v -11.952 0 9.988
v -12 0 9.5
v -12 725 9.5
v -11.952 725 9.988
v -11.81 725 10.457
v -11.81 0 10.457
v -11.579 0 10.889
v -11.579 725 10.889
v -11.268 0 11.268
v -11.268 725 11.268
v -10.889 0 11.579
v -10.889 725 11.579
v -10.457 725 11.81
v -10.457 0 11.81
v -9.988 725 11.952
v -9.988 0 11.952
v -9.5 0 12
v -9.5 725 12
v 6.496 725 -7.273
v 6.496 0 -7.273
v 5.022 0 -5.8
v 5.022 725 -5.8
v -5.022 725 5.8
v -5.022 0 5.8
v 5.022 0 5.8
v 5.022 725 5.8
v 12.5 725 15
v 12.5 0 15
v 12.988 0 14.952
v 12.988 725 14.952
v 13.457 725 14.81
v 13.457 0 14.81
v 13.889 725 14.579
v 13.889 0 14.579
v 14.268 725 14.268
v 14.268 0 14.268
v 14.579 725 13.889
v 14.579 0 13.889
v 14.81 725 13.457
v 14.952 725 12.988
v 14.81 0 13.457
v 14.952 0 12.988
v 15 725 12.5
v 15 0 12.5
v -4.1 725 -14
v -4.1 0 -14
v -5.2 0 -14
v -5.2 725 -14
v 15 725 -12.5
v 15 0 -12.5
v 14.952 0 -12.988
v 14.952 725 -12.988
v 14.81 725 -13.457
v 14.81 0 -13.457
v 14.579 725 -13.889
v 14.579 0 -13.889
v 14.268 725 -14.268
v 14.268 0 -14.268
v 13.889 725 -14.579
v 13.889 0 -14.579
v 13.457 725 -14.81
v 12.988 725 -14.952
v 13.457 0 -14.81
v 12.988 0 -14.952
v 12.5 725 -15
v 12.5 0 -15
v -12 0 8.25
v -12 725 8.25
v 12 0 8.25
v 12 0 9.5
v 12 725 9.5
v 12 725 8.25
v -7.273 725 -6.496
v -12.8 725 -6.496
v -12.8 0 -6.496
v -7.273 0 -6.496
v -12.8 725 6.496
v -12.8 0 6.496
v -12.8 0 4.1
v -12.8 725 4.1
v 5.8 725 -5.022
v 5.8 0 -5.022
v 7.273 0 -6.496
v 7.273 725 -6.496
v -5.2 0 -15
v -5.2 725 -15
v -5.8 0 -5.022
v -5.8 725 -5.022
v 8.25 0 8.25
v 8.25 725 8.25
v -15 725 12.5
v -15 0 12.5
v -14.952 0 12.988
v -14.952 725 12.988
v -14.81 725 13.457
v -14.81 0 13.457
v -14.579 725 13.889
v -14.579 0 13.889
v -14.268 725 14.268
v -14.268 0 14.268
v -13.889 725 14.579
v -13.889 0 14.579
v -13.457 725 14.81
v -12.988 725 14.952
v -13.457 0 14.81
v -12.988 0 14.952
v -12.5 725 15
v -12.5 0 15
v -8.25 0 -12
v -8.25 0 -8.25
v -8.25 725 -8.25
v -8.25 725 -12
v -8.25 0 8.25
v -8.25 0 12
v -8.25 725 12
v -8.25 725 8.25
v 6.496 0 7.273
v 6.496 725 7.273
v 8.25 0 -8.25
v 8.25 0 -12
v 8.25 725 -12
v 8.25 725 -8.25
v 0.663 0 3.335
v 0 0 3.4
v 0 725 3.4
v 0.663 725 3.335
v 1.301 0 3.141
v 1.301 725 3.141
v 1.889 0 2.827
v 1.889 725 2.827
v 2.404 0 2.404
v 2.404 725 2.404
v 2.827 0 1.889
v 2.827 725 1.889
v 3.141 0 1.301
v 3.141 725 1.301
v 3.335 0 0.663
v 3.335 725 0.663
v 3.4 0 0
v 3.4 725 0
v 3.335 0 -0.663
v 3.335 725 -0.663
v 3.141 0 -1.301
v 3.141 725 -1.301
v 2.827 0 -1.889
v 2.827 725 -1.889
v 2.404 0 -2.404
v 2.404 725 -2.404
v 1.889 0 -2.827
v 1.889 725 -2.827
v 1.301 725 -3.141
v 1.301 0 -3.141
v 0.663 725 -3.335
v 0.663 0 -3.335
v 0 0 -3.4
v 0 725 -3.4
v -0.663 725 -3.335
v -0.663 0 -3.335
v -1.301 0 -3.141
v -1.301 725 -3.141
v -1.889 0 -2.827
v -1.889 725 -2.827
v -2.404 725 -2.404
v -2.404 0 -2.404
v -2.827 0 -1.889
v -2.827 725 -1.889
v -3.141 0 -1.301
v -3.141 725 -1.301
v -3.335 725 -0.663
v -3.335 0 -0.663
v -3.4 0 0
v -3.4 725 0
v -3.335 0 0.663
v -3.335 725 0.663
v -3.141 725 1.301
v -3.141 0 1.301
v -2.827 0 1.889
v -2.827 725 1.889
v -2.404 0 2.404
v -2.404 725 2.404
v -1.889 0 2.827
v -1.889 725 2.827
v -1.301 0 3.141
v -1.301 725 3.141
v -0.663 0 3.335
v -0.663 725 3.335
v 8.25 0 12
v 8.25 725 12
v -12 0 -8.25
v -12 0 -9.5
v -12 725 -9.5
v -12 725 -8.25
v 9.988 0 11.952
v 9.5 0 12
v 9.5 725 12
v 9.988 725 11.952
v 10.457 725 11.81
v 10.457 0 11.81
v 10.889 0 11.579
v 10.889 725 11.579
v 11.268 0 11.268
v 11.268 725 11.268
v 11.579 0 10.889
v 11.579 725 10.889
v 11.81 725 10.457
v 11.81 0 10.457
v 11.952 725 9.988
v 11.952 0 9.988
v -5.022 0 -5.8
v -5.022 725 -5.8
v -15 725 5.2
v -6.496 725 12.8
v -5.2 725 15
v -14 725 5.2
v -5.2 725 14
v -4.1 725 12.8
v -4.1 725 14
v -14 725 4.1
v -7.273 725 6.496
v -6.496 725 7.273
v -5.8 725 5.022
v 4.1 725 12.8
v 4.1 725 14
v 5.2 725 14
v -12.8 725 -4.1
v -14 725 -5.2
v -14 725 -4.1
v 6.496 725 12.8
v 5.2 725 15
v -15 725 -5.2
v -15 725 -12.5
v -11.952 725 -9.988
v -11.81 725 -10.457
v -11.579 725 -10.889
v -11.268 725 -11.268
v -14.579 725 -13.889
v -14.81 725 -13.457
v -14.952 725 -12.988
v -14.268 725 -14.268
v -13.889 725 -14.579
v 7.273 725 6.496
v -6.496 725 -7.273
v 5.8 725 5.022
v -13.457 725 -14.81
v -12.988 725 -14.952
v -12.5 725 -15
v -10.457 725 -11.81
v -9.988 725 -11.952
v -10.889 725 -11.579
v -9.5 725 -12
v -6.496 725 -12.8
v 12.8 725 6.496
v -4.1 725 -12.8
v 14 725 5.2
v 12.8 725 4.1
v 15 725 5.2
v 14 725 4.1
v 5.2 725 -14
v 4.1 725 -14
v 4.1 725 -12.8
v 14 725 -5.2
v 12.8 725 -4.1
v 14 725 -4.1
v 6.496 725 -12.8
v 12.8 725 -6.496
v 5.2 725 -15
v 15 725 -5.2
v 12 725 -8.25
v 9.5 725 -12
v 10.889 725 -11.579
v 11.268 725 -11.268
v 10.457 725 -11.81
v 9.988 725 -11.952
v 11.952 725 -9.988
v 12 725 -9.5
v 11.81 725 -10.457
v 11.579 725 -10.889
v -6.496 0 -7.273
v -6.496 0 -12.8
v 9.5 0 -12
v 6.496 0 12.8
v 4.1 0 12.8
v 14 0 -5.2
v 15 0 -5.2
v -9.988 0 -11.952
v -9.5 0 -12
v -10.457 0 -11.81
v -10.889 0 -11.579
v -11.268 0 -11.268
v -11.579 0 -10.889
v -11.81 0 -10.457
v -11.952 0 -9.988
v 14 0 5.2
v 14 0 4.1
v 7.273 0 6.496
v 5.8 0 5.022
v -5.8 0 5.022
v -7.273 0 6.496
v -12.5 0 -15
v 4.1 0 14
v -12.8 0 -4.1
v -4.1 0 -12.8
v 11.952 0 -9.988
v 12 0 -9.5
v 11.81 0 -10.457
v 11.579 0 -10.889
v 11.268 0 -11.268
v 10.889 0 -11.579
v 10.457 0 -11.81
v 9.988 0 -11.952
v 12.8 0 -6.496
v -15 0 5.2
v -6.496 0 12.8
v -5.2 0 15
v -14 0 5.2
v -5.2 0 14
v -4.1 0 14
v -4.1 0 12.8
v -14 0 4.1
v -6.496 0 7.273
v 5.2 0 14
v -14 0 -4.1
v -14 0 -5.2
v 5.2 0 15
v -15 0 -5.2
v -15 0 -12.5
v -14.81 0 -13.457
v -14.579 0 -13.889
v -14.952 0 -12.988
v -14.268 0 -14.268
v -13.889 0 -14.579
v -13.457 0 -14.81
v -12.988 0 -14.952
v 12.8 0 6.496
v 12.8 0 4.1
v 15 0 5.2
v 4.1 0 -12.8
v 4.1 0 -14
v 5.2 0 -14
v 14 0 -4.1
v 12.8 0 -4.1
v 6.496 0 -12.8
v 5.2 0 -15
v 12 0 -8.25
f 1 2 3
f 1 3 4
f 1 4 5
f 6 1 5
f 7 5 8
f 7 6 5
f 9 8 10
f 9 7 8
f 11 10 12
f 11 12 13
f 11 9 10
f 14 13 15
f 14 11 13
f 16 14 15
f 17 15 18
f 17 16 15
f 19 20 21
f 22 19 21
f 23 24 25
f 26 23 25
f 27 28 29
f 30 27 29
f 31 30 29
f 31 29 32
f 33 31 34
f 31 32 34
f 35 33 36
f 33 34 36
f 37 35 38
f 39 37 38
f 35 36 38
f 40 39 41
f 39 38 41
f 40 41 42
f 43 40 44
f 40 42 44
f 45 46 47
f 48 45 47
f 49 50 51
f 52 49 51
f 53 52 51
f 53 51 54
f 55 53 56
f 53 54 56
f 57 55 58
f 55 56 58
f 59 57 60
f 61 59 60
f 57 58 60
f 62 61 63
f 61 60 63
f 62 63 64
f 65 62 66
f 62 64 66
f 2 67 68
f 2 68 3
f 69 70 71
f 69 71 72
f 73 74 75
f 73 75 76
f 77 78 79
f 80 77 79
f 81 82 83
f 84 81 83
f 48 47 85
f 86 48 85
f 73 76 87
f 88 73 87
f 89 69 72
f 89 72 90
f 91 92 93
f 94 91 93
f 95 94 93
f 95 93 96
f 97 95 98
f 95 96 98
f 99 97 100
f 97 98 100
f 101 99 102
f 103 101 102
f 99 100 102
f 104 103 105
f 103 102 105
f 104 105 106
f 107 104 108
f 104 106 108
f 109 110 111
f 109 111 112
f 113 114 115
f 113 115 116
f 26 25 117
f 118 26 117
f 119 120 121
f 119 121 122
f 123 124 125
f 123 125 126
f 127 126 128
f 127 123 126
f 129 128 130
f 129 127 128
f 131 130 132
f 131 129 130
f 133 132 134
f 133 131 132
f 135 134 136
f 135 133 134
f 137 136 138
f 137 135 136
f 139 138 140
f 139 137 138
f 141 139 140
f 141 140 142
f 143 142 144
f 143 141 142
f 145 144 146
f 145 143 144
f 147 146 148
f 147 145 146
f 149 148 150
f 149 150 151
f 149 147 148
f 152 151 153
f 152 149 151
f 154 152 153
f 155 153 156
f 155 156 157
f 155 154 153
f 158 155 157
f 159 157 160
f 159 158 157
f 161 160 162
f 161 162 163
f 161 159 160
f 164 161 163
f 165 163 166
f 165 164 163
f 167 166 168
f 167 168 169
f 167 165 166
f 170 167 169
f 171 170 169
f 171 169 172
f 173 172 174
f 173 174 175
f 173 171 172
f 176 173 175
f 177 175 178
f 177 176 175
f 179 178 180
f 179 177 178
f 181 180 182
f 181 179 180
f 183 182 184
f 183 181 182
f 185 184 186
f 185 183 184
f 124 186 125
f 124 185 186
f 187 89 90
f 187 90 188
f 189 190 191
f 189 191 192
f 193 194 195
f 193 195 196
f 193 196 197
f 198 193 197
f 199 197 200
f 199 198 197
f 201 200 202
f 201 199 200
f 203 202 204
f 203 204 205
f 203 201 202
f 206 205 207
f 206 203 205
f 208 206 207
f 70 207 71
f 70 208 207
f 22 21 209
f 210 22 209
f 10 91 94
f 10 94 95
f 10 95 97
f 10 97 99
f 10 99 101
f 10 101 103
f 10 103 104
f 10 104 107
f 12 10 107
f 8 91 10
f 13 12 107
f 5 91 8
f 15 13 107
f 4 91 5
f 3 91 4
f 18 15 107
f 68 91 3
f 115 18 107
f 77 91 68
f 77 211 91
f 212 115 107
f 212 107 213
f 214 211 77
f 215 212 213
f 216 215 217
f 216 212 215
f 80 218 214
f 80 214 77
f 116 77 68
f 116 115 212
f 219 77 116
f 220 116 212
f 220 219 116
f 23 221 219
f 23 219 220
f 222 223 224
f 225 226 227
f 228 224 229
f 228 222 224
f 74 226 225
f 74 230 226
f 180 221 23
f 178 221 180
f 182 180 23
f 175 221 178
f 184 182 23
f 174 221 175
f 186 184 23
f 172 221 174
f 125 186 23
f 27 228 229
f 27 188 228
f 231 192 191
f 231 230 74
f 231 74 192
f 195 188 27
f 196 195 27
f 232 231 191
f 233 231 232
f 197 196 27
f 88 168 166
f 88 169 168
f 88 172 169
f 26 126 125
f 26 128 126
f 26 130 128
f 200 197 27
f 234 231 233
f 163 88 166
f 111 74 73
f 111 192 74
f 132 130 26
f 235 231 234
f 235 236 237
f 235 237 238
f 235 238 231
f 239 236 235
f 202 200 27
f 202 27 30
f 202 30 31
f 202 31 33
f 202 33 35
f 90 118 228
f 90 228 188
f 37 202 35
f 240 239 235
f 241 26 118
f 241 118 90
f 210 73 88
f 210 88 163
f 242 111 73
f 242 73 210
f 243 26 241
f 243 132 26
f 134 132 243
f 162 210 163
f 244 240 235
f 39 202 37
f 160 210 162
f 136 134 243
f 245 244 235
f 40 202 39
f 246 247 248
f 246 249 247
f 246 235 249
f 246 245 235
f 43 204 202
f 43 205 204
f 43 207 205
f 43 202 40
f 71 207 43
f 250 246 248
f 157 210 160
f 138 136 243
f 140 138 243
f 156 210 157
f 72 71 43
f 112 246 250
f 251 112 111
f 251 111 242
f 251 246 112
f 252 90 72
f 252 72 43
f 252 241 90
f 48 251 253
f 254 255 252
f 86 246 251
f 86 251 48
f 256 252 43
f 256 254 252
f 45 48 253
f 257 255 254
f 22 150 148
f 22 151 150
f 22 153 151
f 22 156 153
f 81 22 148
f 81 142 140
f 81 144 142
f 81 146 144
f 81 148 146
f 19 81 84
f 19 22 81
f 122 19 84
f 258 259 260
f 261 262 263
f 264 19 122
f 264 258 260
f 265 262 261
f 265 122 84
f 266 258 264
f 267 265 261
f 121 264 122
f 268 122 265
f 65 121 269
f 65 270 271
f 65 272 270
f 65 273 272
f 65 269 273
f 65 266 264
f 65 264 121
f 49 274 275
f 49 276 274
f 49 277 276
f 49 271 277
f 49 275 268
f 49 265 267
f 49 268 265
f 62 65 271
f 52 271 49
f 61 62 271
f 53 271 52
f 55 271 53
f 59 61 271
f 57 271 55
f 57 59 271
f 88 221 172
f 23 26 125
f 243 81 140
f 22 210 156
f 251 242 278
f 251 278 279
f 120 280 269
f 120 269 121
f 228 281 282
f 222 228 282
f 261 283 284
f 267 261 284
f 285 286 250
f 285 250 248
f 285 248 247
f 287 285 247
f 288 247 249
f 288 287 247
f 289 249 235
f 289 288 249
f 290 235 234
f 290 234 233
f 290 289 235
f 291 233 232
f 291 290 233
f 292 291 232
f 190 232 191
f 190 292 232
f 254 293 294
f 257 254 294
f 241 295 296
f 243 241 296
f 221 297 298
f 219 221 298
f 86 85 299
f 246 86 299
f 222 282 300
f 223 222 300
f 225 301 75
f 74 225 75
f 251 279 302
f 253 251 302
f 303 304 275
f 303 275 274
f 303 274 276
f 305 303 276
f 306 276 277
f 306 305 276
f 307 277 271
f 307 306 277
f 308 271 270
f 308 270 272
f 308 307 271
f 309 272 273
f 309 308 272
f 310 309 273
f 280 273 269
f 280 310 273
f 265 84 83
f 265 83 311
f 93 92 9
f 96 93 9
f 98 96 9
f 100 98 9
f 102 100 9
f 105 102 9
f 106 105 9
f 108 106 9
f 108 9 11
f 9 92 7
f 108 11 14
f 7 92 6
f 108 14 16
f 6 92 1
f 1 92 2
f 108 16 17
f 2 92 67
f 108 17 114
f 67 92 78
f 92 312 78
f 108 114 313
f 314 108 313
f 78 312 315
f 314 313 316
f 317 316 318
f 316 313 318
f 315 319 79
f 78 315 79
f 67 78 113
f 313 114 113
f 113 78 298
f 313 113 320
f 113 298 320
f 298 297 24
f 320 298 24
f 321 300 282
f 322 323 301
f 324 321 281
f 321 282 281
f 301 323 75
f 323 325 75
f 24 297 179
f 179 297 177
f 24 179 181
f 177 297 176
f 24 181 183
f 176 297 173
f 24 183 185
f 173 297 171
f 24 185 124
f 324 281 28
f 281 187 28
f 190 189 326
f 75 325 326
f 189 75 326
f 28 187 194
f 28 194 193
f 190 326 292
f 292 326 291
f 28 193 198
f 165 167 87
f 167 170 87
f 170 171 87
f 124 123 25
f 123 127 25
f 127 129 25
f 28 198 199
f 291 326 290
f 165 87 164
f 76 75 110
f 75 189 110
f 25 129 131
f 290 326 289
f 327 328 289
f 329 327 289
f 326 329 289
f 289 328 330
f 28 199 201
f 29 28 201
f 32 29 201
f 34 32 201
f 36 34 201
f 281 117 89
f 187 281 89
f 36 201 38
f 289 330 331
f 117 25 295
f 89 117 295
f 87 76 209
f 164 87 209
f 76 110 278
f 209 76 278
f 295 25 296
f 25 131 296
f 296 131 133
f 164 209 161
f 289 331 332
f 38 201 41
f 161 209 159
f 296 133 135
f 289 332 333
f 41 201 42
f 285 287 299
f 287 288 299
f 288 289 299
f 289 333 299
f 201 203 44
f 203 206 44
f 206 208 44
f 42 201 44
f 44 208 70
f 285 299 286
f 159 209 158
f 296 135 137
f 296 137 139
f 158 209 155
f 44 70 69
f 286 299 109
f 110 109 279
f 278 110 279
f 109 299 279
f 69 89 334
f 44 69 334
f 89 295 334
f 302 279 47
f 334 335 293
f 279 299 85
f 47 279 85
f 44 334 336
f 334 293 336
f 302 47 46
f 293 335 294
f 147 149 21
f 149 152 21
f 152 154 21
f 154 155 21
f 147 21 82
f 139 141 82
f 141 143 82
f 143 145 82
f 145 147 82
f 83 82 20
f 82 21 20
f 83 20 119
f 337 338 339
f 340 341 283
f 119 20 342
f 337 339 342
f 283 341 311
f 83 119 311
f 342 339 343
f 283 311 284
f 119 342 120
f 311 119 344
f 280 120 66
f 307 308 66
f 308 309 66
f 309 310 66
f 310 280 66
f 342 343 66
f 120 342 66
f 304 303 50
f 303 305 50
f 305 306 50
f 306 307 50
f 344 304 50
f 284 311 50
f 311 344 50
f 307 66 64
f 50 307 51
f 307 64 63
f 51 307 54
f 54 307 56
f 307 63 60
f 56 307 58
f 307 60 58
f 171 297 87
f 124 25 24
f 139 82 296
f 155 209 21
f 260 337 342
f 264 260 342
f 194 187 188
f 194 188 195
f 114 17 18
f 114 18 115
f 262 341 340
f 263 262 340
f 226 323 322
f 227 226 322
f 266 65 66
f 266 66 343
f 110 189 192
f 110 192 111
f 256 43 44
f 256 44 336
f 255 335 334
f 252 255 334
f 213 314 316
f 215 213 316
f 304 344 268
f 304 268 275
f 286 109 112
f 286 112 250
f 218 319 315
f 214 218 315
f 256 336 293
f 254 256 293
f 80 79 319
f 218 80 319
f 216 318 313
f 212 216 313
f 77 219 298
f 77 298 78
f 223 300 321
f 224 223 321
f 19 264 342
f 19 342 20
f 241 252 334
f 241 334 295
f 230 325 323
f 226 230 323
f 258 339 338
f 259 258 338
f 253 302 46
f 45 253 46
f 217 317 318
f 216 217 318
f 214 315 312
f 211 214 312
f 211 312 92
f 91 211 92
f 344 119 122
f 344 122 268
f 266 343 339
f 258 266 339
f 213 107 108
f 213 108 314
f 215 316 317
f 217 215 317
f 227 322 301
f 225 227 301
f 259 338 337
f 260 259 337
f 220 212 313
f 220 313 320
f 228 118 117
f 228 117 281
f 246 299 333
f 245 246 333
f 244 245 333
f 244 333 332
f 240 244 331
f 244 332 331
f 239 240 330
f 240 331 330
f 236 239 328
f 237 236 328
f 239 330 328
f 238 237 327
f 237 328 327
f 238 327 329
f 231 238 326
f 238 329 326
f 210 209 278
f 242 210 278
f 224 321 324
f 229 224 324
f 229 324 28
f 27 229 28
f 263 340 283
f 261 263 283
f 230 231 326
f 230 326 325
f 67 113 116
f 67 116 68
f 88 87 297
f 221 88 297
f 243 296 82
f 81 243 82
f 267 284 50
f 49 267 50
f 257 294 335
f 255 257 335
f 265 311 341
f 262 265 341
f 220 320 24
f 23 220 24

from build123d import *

# Parameters (mm, degrees)
SKETCH_1_R      = 3.4
EXTRUDE_1_DEPTH = 725


with BuildPart() as part:
    # 草图1 → 凸台-拉伸1 (new body)
    with BuildSketch(Plane(origin=(0, 0, 0), x_dir=(1, 0, 0), z_dir=(0, 1, 0))):
        with BuildLine():
            Line((-12.8, 4.1), (-12.8, 6.495575748))
            Line((-12.8, 6.495575748), (-7.273393207, 6.495575748))
            Line((-7.273393207, 6.495575748), (-5.8, 5.022182541))
            Line((-5.8, 5.022182541), (-5.8, 0))
            Line((-5.8, 0), (-5.8, -5.022182541))
            Line((-5.8, -5.022182541), (-7.273393207, -6.495575748))
            Line((-7.273393207, -6.495575748), (-12.8, -6.495575748))
            Line((-12.8, -6.495575748), (-12.8, -4.1))
            Line((-12.8, -4.1), (-14, -4.1))
            Line((-14, -4.1), (-14, -5.2))
            Line((-14, -5.2), (-15, -5.2))
            Line((-15, -5.2), (-15, -12.5))
            ThreePointArc((-15, -12.5), (-14.267766953, -14.267766953), (-12.5, -15))
            Line((-12.5, -15), (-5.2, -15))
            Line((-5.2, -15), (-5.2, -14))
            Line((-5.2, -14), (-4.1, -14))
            Line((-4.1, -14), (-4.1, -12.8))
            Line((-4.1, -12.8), (-6.495575748, -12.8))
            Line((-6.495575748, -12.8), (-6.495575748, -7.273393207))
            Line((-6.495575748, -7.273393207), (-5.022182541, -5.8))
            Line((-5.022182541, -5.8), (0, -5.8))
            Line((0, -5.8), (5.022182541, -5.8))
            Line((5.022182541, -5.8), (6.495575748, -7.273393207))
            Line((6.495575748, -7.273393207), (6.495575748, -12.8))
            Line((6.495575748, -12.8), (4.1, -12.8))
            Line((4.1, -12.8), (4.1, -14))
            Line((4.1, -14), (5.2, -14))
            Line((5.2, -14), (5.2, -15))
            Line((5.2, -15), (12.5, -15))
            ThreePointArc((12.5, -15), (14.267766953, -14.267766953), (15, -12.5))
            Line((15, -12.5), (15, -5.2))
            Line((15, -5.2), (14, -5.2))
            Line((14, -5.2), (14, -4.1))
            Line((14, -4.1), (12.8, -4.1))
            Line((12.8, -4.1), (12.8, -6.495575748))
            Line((12.8, -6.495575748), (7.273393207, -6.495575748))
            Line((7.273393207, -6.495575748), (5.8, -5.022182541))
            Line((5.8, -5.022182541), (5.8, 0))
            Line((5.8, 0), (5.8, 5.022182541))
            Line((5.8, 5.022182541), (7.273393207, 6.495575748))
            Line((7.273393207, 6.495575748), (12.8, 6.495575748))
            Line((12.8, 6.495575748), (12.8, 4.1))
            Line((12.8, 4.1), (14, 4.1))
            Line((14, 4.1), (14, 5.2))
            Line((14, 5.2), (15, 5.2))
            Line((15, 5.2), (15, 12.5))
            ThreePointArc((15, 12.5), (14.267766953, 14.267766953), (12.5, 15))
            Line((12.5, 15), (5.2, 15))
            Line((5.2, 15), (5.2, 14))
            Line((5.2, 14), (4.1, 14))
            Line((4.1, 14), (4.1, 12.8))
            Line((4.1, 12.8), (6.495575748, 12.8))
            Line((6.495575748, 12.8), (6.495575748, 7.273393207))
            Line((6.495575748, 7.273393207), (5.022182541, 5.8))
            Line((5.022182541, 5.8), (0, 5.8))
            Line((0, 5.8), (-5.022182541, 5.8))
            Line((-5.022182541, 5.8), (-6.495575748, 7.273393207))
            Line((-6.495575748, 7.273393207), (-6.495575748, 12.8))
            Line((-6.495575748, 12.8), (-4.1, 12.8))
            Line((-4.1, 12.8), (-4.1, 14))
            Line((-4.1, 14), (-5.2, 14))
            Line((-5.2, 14), (-5.2, 15))
            Line((-5.2, 15), (-12.5, 15))
            ThreePointArc((-12.5, 15), (-14.267766953, 14.267766953), (-15, 12.5))
            Line((-15, 12.5), (-15, 5.2))
            Line((-15, 5.2), (-14, 5.2))
            Line((-14, 5.2), (-14, 4.1))
            Line((-14, 4.1), (-12.8, 4.1))
        make_face()
        with Locations(Location((0, 0, 0), (0, 0, 270))):
            Circle(SKETCH_1_R, mode=Mode.SUBTRACT)
        with BuildLine():
            Line((-12, 9.5), (-12, 8.25))
            Line((-12, 8.25), (-8.25, 8.25))
            Line((-8.25, 8.25), (-8.25, 12))
            Line((-8.25, 12), (-9.5, 12))
            ThreePointArc((-9.5, 12), (-11.267766953, 11.267766953), (-12, 9.5))
        make_face(mode=Mode.SUBTRACT)
        with BuildLine():
            Line((9.5, 12), (8.25, 12))
            Line((8.25, 12), (8.25, 8.25))
            Line((8.25, 8.25), (12, 8.25))
            Line((12, 8.25), (12, 9.5))
            ThreePointArc((12, 9.5), (11.267766953, 11.267766953), (9.5, 12))
        make_face(mode=Mode.SUBTRACT)
        with BuildLine():
            Line((12, -9.5), (12, -8.25))
            Line((12, -8.25), (8.25, -8.25))
            Line((8.25, -8.25), (8.25, -12))
            Line((8.25, -12), (9.5, -12))
            ThreePointArc((9.5, -12), (11.267766953, -11.267766953), (12, -9.5))
        make_face(mode=Mode.SUBTRACT)
        with BuildLine():
            Line((-9.5, -12), (-8.25, -12))
            Line((-8.25, -12), (-8.25, -8.25))
            Line((-8.25, -8.25), (-12, -8.25))
            Line((-12, -8.25), (-12, -9.5))
            ThreePointArc((-12, -9.5), (-11.267766953, -11.267766953), (-9.5, -12))
        make_face(mode=Mode.SUBTRACT)
    extrude(amount=EXTRUDE_1_DEPTH)


solid = part.part
